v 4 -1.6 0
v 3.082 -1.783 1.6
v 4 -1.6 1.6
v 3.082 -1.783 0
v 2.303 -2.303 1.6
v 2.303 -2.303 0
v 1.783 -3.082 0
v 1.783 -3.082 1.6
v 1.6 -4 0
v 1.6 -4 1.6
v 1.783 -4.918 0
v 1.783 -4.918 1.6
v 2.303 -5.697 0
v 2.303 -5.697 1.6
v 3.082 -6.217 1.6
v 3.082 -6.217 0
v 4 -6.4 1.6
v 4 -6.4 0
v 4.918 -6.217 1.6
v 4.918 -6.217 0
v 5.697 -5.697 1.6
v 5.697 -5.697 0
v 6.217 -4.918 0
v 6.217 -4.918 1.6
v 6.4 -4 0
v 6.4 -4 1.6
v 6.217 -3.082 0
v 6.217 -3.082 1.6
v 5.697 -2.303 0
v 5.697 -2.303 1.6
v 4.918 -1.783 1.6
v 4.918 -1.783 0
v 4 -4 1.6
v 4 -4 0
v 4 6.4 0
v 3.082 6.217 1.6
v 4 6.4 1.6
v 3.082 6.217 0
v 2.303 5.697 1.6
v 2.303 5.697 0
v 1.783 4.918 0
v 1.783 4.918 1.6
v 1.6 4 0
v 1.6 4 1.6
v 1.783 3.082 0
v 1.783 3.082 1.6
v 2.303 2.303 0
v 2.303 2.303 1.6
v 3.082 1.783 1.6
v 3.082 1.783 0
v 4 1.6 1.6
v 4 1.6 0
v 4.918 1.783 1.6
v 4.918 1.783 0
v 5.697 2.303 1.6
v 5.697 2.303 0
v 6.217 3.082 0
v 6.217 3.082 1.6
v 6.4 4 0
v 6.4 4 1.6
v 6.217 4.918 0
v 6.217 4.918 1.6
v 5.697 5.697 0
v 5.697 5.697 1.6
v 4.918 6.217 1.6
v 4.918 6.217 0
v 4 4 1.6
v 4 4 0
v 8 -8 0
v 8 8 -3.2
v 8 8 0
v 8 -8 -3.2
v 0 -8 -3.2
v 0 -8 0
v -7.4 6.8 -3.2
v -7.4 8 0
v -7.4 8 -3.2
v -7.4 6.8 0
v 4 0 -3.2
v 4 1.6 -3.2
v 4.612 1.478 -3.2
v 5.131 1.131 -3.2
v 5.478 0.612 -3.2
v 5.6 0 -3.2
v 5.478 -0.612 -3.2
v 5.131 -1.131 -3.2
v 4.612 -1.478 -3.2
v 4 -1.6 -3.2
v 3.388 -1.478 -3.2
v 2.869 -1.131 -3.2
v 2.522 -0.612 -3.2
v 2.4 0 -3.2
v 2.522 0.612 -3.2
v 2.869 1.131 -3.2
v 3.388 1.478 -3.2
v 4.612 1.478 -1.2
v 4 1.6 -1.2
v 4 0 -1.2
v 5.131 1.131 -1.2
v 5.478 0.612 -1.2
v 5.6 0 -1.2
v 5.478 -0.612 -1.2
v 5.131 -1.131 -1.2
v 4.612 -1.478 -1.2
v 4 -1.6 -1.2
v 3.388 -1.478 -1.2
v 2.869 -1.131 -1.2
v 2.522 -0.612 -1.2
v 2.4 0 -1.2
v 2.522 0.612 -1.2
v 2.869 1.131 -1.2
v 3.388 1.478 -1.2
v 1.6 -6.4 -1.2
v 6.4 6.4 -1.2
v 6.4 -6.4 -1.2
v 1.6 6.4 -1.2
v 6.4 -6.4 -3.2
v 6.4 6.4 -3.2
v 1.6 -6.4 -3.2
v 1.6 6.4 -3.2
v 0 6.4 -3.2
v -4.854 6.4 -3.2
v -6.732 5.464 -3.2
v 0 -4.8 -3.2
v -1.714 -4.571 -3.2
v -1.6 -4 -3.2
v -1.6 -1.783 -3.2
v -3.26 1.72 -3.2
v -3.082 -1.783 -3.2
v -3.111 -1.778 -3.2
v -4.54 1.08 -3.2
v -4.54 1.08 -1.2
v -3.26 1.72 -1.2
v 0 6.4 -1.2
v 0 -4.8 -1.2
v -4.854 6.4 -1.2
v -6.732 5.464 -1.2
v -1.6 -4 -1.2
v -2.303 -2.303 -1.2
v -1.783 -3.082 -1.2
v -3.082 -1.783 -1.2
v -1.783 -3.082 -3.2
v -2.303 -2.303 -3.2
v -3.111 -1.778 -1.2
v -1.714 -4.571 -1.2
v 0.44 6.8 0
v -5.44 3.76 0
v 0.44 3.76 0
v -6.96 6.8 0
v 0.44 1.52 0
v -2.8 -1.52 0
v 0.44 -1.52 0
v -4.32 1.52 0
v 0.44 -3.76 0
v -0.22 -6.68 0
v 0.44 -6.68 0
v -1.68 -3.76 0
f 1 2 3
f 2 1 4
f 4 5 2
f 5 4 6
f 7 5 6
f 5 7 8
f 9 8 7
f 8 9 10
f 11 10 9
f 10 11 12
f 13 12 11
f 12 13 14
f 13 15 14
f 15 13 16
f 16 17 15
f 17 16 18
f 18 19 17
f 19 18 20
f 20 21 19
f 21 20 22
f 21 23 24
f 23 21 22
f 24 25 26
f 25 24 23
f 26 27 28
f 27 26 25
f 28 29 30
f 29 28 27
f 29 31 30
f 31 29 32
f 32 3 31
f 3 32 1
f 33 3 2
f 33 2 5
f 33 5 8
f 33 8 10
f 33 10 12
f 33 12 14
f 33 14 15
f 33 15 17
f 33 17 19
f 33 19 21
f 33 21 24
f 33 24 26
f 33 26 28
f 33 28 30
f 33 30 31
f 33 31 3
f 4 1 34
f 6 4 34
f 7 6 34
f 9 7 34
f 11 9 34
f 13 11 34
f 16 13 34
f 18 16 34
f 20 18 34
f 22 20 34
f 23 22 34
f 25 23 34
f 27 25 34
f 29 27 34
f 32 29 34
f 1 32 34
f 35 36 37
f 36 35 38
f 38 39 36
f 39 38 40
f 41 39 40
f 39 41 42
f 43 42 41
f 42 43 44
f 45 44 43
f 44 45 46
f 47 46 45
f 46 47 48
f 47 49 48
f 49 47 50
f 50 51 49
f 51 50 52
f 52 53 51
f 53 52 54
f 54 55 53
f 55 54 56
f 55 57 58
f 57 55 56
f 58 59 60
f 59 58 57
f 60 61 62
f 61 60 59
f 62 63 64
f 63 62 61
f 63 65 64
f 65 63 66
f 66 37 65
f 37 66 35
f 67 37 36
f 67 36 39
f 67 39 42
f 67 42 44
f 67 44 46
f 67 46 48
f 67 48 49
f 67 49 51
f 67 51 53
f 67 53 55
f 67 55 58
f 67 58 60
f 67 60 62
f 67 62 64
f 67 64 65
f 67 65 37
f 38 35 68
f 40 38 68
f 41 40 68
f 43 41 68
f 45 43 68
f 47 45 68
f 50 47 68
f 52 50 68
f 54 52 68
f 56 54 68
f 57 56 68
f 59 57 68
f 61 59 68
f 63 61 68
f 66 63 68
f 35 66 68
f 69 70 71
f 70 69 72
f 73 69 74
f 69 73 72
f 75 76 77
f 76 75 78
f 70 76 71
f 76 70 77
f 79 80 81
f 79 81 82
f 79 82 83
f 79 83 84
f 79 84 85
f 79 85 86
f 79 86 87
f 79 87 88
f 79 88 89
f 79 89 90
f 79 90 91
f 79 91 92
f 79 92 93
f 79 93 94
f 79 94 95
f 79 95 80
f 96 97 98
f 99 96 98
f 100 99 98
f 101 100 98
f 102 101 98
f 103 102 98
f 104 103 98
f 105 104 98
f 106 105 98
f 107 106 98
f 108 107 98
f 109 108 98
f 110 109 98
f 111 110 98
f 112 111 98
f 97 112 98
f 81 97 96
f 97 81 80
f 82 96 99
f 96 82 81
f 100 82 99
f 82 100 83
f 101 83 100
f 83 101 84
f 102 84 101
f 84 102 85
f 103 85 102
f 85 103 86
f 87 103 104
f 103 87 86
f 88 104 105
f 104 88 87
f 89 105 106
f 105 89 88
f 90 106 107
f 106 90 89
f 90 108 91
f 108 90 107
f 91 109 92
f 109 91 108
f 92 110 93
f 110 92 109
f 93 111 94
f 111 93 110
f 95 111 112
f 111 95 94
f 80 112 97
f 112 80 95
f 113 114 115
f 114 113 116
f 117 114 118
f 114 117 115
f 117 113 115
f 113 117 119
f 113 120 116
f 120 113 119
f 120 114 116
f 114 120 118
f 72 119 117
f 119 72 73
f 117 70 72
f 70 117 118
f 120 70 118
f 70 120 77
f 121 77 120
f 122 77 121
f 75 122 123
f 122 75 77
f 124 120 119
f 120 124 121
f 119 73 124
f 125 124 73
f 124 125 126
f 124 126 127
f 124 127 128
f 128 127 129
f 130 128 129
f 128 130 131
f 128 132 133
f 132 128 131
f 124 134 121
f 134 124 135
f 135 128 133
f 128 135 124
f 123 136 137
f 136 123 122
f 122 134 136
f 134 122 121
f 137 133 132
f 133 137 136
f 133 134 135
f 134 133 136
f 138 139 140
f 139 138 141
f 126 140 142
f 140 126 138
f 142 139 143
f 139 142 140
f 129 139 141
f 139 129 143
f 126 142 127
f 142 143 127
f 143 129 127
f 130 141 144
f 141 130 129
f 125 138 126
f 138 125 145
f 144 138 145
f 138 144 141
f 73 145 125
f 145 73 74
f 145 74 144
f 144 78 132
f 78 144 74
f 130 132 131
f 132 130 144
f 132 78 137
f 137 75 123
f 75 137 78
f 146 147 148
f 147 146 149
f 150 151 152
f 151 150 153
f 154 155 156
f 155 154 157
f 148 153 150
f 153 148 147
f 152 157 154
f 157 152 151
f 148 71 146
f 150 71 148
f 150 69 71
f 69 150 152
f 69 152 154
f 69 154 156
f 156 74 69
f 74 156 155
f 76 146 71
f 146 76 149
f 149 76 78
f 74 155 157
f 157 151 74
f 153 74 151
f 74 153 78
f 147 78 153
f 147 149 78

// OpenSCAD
// file: ../p/3-16edge.scad
use <../lib.scad>
function ldraw_lib__3_16edge() = [
// 0 Circle 0.1875
// 0 Name: 3-16edge.dat
// 0 Author: Donald Sutter [technog]
// 0 !LDRAW_ORG Primitive UPDATE 2017-01
// 0 !LICENSE Licensed under CC BY 4.0 : see CAreadme.txt
// 
// 0 BFC CERTIFY CCW
  [0,"BFC","CERTIFY"],
  [0,"BFC","CCW"],
// 
// 0 !HISTORY 2004-03-02 [PTadmin] Official Update 2004-01
// 0 !HISTORY 2007-06-24 [PTadmin] Header formatted for Contributor Agreement
// 0 !HISTORY 2008-07-01 [PTadmin] Official Update 2008-01
// 0 !HISTORY 2017-01-15 [Steffen] BFCed
// 0 !HISTORY 2017-12-30 [PTadmin] Official Update 2017-01
// 
// 
// 2 24 1 0 0 0.9239 0 0.3827
  [2,24,1,0,0,0.9239,0,0.3827],
// 2 24 0.9239 0 0.3827 0.7071 0 0.7071
  [2,24,0.9239,0,0.3827,0.7071,0,0.7071],
// 2 24 0.7071 0 0.7071 0.3827 0 0.9239
  [2,24,0.7071,0,0.7071,0.3827,0,0.9239],
];
module ldraw_lib__3_16edge(step=0, col=false, unit=2/5, alt=false, line=0.2, solid=!$preview)
    makepoly(ldraw_lib__3_16edge(), step=step, col=col, unit=unit, alt=alt, line=line, solid=solid);
ldraw_lib__3_16edge(line=0.2);
// file: ../p/3-16cyli.scad
use <../lib.scad>
$fa=1; $fs=0.2;
function ldraw_lib__3_16cyli(realsolid=false) = [
// 0 Cylinder 0.1875
// 0 Name: 3-16cyli.dat
// 0 Author: Mark Kennedy [mkennedy]
// 0 !LDRAW_ORG Primitive UPDATE 2005-01
// 0 !LICENSE Licensed under CC BY 2.0 and CC BY 4.0 : see CAreadme.txt
// 
// 0 BFC CERTIFY CCW
  [0,"BFC","CERTIFY"],
  [0,"BFC","CCW"],
// 
// 0 !HISTORY 2004-03-02 [PTadmin] Official Update 2004-01
// 0 !HISTORY 2004-12-11 [nielsk] Recreated using Primitive Generator, Edge lines fixed, BFC changed to CCW
// 0 !HISTORY 2005-12-28 [PTadmin] Official Update 2005-01
// 0 !HISTORY 2007-06-24 [PTadmin] Header formatted for Contributor Agreement
// 0 !HISTORY 2008-07-01 [PTadmin] Official Update 2008-01
// 
// 
// 4 16 .9239 1 .3827 .9239 0 .3827 1 0 0 1 1 0
  [4,16,.9239,1,.3827,.9239,0,.3827,1,0,0,1,1,0],
// 4 16 .7071 1 .7071 .7071 0 .7071 .9239 0 .3827 .9239 1 .3827
  [4,16,.7071,1,.7071,.7071,0,.7071,.9239,0,.3827,.9239,1,.3827],
// 4 16 .3827 1 .9239 .3827 0 .9239 .7071 0 .7071 .7071 1 .7071
  [4,16,.3827,1,.9239,.3827,0,.9239,.7071,0,.7071,.7071,1,.7071],
// 5 24 1 1 0 1 0 0 1 1 -.4142 .9239 1 .3827
  [5,24,1,1,0,1,0,0,1,1,-.4142,.9239,1,.3827],
// 5 24 .9239 1 .3827 .9239 0 .3827 1 1 0 .7071 1 .7071
  [5,24,.9239,1,.3827,.9239,0,.3827,1,1,0,.7071,1,.7071],
// 5 24 .7071 1 .7071 .7071 0 .7071 .9239 1 .3827 .3827 1 .9239
  [5,24,.7071,1,.7071,.7071,0,.7071,.9239,1,.3827,.3827,1,.9239],
// 5 24 .3827 1 .9239 .3827 0 .9239 .7071 1 .7071 0 1 1.0824
  [5,24,.3827,1,.9239,.3827,0,.9239,.7071,1,.7071,0,1,1.0824],
// 0
];
module ldraw_lib__3_16cyli(step=0, col=false, unit=2/5, alt=false, line=0.2, solid=!$preview)
    makepoly(ldraw_lib__3_16cyli(solid), step=step, col=col, unit=unit, alt=alt, line=line, solid=solid);
ldraw_lib__3_16cyli(line=0.2);
// file: ../p/4-4edge.scad
use <../lib.scad>
function ldraw_lib__4_4edge() = [
// 0 Circle 1.0
// 0 Name: 4-4edge.dat
// 0 Author: James Jessiman
// 0 !LDRAW_ORG Primitive UPDATE 2017-01
// 0 !LICENSE Licensed under CC BY 2.0 and CC BY 4.0 : see CAreadme.txt
// 
// 0 BFC CERTIFY CCW
  [0,"BFC","CERTIFY"],
  [0,"BFC","CCW"],
// 
// 0 !HISTORY 1998-12-15 [PTadmin] Official Update 1998-10
// 0 !HISTORY 2005-12-28 [PTadmin] Official Update 2005-01
// 0 !HISTORY 2007-06-24 [PTadmin] Header formatted for Contributor Agreement
// 0 !HISTORY 2008-07-01 [PTadmin] Official Update 2008-01
// 0 !HISTORY 2017-01-15 [Steffen] BFCed
// 0 !HISTORY 2017-12-30 [PTadmin] Official Update 2017-01
// 
// 
// 2 24 1 0 0 0.9239 0 0.3827
  [2,24,1,0,0,0.9239,0,0.3827],
// 2 24 0.9239 0 0.3827 0.7071 0 0.7071
  [2,24,0.9239,0,0.3827,0.7071,0,0.7071],
// 2 24 0.7071 0 0.7071 0.3827 0 0.9239
  [2,24,0.7071,0,0.7071,0.3827,0,0.9239],
// 2 24 0.3827 0 0.9239 0 0 1
  [2,24,0.3827,0,0.9239,0,0,1],
// 2 24 0 0 1 -0.3827 0 0.9239
  [2,24,0,0,1,-0.3827,0,0.9239],
// 2 24 -0.3827 0 0.9239 -0.7071 0 0.7071
  [2,24,-0.3827,0,0.9239,-0.7071,0,0.7071],
// 2 24 -0.7071 0 0.7071 -0.9239 0 0.3827
  [2,24,-0.7071,0,0.7071,-0.9239,0,0.3827],
// 2 24 -0.9239 0 0.3827 -1 0 -0
  [2,24,-0.9239,0,0.3827,-1,0,-0],
// 2 24 -1 0 -0 -0.9239 0 -0.3827
  [2,24,-1,0,-0,-0.9239,0,-0.3827],
// 2 24 -0.9239 0 -0.3827 -0.7071 0 -0.7071
  [2,24,-0.9239,0,-0.3827,-0.7071,0,-0.7071],
// 2 24 -0.7071 0 -0.7071 -0.3827 0 -0.9239
  [2,24,-0.7071,0,-0.7071,-0.3827,0,-0.9239],
// 2 24 -0.3827 0 -0.9239 0 0 -1
  [2,24,-0.3827,0,-0.9239,0,0,-1],
// 2 24 0 0 -1 0.3827 0 -0.9239
  [2,24,0,0,-1,0.3827,0,-0.9239],
// 2 24 0.3827 0 -0.9239 0.7071 0 -0.7071
  [2,24,0.3827,0,-0.9239,0.7071,0,-0.7071],
// 2 24 0.7071 0 -0.7071 0.9239 0 -0.3827
  [2,24,0.7071,0,-0.7071,0.9239,0,-0.3827],
// 2 24 0.9239 0 -0.3827 1 0 0
  [2,24,0.9239,0,-0.3827,1,0,0],
];
module ldraw_lib__4_4edge(step=0, col=false, unit=2/5, alt=false, line=0.2, solid=!$preview)
    makepoly(ldraw_lib__4_4edge(), step=step, col=col, unit=unit, alt=alt, line=line, solid=solid);
ldraw_lib__4_4edge(line=0.2);
// file: ../p/4-4disc.scad
use <../lib.scad>
function ldraw_lib__4_4disc() = [
// 0 Disc 1.0
// 0 Name: 4-4disc.dat
// 0 Author: James Jessiman
// 0 !LDRAW_ORG Primitive UPDATE 2002-02
// 0 !LICENSE Licensed under CC BY 2.0 and CC BY 4.0 : see CAreadme.txt
// 
// 0 BFC CERTIFY CCW
  [0,"BFC","CERTIFY"],
  [0,"BFC","CCW"],
// 
// 0 !HISTORY 1998-12-15 [PTadmin] Official Update 1998-10
// 0 !HISTORY 2002-03-23 [sbliss] Added BFC statement
// 0 !HISTORY 2002-04-25 [PTadmin] Official Update 2002-02
// 0 !HISTORY 2007-06-24 [PTadmin] Header formatted for Contributor Agreement
// 0 !HISTORY 2008-07-01 [PTadmin] Official Update 2008-01
// 
// 
// 3 16 0 0 0 1 0 0 0.9239 0 0.3827
  [3,16,0,0,0,1,0,0,0.9239,0,0.3827],
// 3 16 0 0 0 0.9239 0 0.3827 0.7071 0 0.7071
  [3,16,0,0,0,0.9239,0,0.3827,0.7071,0,0.7071],
// 3 16 0 0 0 0.7071 0 0.7071 0.3827 0 0.9239
  [3,16,0,0,0,0.7071,0,0.7071,0.3827,0,0.9239],
// 3 16 0 0 0 0.3827 0 0.9239 0 0 1
  [3,16,0,0,0,0.3827,0,0.9239,0,0,1],
// 3 16 0 0 0 0 0 1 -0.3827 0 0.9239
  [3,16,0,0,0,0,0,1,-0.3827,0,0.9239],
// 3 16 0 0 0 -0.3827 0 0.9239 -0.7071 0 0.7071
  [3,16,0,0,0,-0.3827,0,0.9239,-0.7071,0,0.7071],
// 3 16 0 0 0 -0.7071 0 0.7071 -0.9239 0 0.3827
  [3,16,0,0,0,-0.7071,0,0.7071,-0.9239,0,0.3827],
// 3 16 0 0 0 -0.9239 0 0.3827 -1 0 -0
  [3,16,0,0,0,-0.9239,0,0.3827,-1,0,-0],
// 3 16 0 0 0 -1 0 -0 -0.9239 0 -0.3827
  [3,16,0,0,0,-1,0,-0,-0.9239,0,-0.3827],
// 3 16 0 0 0 -0.9239 0 -0.3827 -0.7071 0 -0.7071
  [3,16,0,0,0,-0.9239,0,-0.3827,-0.7071,0,-0.7071],
// 3 16 0 0 0 -0.7071 0 -0.7071 -0.3827 0 -0.9239
  [3,16,0,0,0,-0.7071,0,-0.7071,-0.3827,0,-0.9239],
// 3 16 0 0 0 -0.3827 0 -0.9239 0 0 -1
  [3,16,0,0,0,-0.3827,0,-0.9239,0,0,-1],
// 3 16 0 0 0 0 0 -1 0.3827 0 -0.9239
  [3,16,0,0,0,0,0,-1,0.3827,0,-0.9239],
// 3 16 0 0 0 0.3827 0 -0.9239 0.7071 0 -0.7071
  [3,16,0,0,0,0.3827,0,-0.9239,0.7071,0,-0.7071],
// 3 16 0 0 0 0.7071 0 -0.7071 0.9239 0 -0.3827
  [3,16,0,0,0,0.7071,0,-0.7071,0.9239,0,-0.3827],
// 3 16 0 0 0 0.9239 0 -0.3827 1 0 0
  [3,16,0,0,0,0.9239,0,-0.3827,1,0,0],
// 0
];
module ldraw_lib__4_4disc(step=0, col=false, unit=2/5, alt=false, line=0.2, solid=!$preview)
    makepoly(ldraw_lib__4_4disc(), step=step, col=col, unit=unit, alt=alt, line=line, solid=solid);
ldraw_lib__4_4disc(line=0.2);
// file: ../p/4-4cyli.scad
use <../lib.scad>
$fa=1; $fs=0.2;
function ldraw_lib__4_4cyli(realsolid=false) = [
// 0 Cylinder 1.0
// 0 Name: 4-4cyli.dat
// 0 Author: James Jessiman
// 0 !LDRAW_ORG Primitive UPDATE 2005-01
// 0 !LICENSE Licensed under CC BY 2.0 and CC BY 4.0 : see CAreadme.txt
// 
// 0 BFC CERTIFY CCW
  [0,"BFC","CERTIFY"],
  [0,"BFC","CCW"],
// 
// 0 !HISTORY 1998-12-15 [PTadmin] Official Update 1998-10
// 0 !HISTORY 2002-03-23 [sbliss] Added BFC statement; merged headers from files in distributions LDraw 0.27 and Complete.
// 0 !HISTORY 2002-04-25 [PTadmin] Official Update 2002-02
// 0 !HISTORY 2004-12-14 [guyvivan] BFC CCW
// 0 !HISTORY 2005-12-28 [PTadmin] Official Update 2005-01
// 0 !HISTORY 2007-06-24 [PTadmin] Header formatted for Contributor Agreement
// 0 !HISTORY 2008-07-01 [PTadmin] Official Update 2008-01
// 
// 
// 4 16 1 1 0 0.9239 1 0.3827 0.9239 0 0.3827 1 0 0
  [4,16,1,1,0,0.9239,1,0.3827,0.9239,0,0.3827,1,0,0],
// 5 24 1 0 0 1 1 0 0.9239 0 0.3827 0.9239 0 -0.3827
  [5,24,1,0,0,1,1,0,0.9239,0,0.3827,0.9239,0,-0.3827],
// 4 16 0.9239 1 0.3827 0.7071 1 0.7071 0.7071 0 0.7071 0.9239 0 0.3827
  [4,16,0.9239,1,0.3827,0.7071,1,0.7071,0.7071,0,0.7071,0.9239,0,0.3827],
// 5 24 0.9239 0 0.3827 0.9239 1 0.3827 0.7071 0 0.7071 1 0 0
  [5,24,0.9239,0,0.3827,0.9239,1,0.3827,0.7071,0,0.7071,1,0,0],
// 4 16 0.7071 1 0.7071 0.3827 1 0.9239 0.3827 0 0.9239 0.7071 0 0.7071
  [4,16,0.7071,1,0.7071,0.3827,1,0.9239,0.3827,0,0.9239,0.7071,0,0.7071],
// 5 24 0.7071 0 0.7071 0.7071 1 0.7071 0.3827 0 0.9239 0.9239 0 0.3827
  [5,24,0.7071,0,0.7071,0.7071,1,0.7071,0.3827,0,0.9239,0.9239,0,0.3827],
// 4 16 0.3827 1 0.9239 0 1 1 0 0 1 0.3827 0 0.9239
  [4,16,0.3827,1,0.9239,0,1,1,0,0,1,0.3827,0,0.9239],
// 5 24 0.3827 0 0.9239 0.3827 1 0.9239 0 0 1 0.7071 0 0.7071
  [5,24,0.3827,0,0.9239,0.3827,1,0.9239,0,0,1,0.7071,0,0.7071],
// 4 16 0 1 1 -0.3827 1 0.9239 -0.3827 0 0.9239 0 0 1
  [4,16,0,1,1,-0.3827,1,0.9239,-0.3827,0,0.9239,0,0,1],
// 5 24 0 0 1 0 1 1 -0.3827 0 0.9239 0.3827 0 0.9239
  [5,24,0,0,1,0,1,1,-0.3827,0,0.9239,0.3827,0,0.9239],
// 4 16 -0.3827 1 0.9239 -0.7071 1 0.7071 -0.7071 0 0.7071 -0.3827 0 0.9239
  [4,16,-0.3827,1,0.9239,-0.7071,1,0.7071,-0.7071,0,0.7071,-0.3827,0,0.9239],
// 5 24 -0.3827 0 0.9239 -0.3827 1 0.9239 -0.7071 0 0.7071 0 0 1
  [5,24,-0.3827,0,0.9239,-0.3827,1,0.9239,-0.7071,0,0.7071,0,0,1],
// 4 16 -0.7071 1 0.7071 -0.9239 1 0.3827 -0.9239 0 0.3827 -0.7071 0 0.7071
  [4,16,-0.7071,1,0.7071,-0.9239,1,0.3827,-0.9239,0,0.3827,-0.7071,0,0.7071],
// 5 24 -0.7071 0 0.7071 -0.7071 1 0.7071 -0.9239 0 0.3827 -0.3827 0 0.9239
  [5,24,-0.7071,0,0.7071,-0.7071,1,0.7071,-0.9239,0,0.3827,-0.3827,0,0.9239],
// 4 16 -0.9239 1 0.3827 -1 1 0 -1 0 0 -0.9239 0 0.3827
  [4,16,-0.9239,1,0.3827,-1,1,0,-1,0,0,-0.9239,0,0.3827],
// 5 24 -0.9239 0 0.3827 -0.9239 1 0.3827 -1 0 0 -0.7071 0 0.7071
  [5,24,-0.9239,0,0.3827,-0.9239,1,0.3827,-1,0,0,-0.7071,0,0.7071],
// 4 16 -1 1 0 -0.9239 1 -0.3827 -0.9239 0 -0.3827 -1 0 0
  [4,16,-1,1,0,-0.9239,1,-0.3827,-0.9239,0,-0.3827,-1,0,0],
// 5 24 -1 0 0 -1 1 0 -0.9239 0 -0.3827 -0.9239 0 0.3827
  [5,24,-1,0,0,-1,1,0,-0.9239,0,-0.3827,-0.9239,0,0.3827],
// 4 16 -0.9239 1 -0.3827 -0.7071 1 -0.7071 -0.7071 0 -0.7071 -0.9239 0 -0.3827
  [4,16,-0.9239,1,-0.3827,-0.7071,1,-0.7071,-0.7071,0,-0.7071,-0.9239,0,-0.3827],
// 5 24 -0.9239 0 -0.3827 -0.9239 1 -0.3827 -0.7071 0 -0.7071 -1 0 0
  [5,24,-0.9239,0,-0.3827,-0.9239,1,-0.3827,-0.7071,0,-0.7071,-1,0,0],
// 4 16 -0.7071 1 -0.7071 -0.3827 1 -0.9239 -0.3827 0 -0.9239 -0.7071 0 -0.7071
  [4,16,-0.7071,1,-0.7071,-0.3827,1,-0.9239,-0.3827,0,-0.9239,-0.7071,0,-0.7071],
// 5 24 -0.7071 0 -0.7071 -0.7071 1 -0.7071 -0.3827 0 -0.9239 -0.9239 0 -0.3827
  [5,24,-0.7071,0,-0.7071,-0.7071,1,-0.7071,-0.3827,0,-0.9239,-0.9239,0,-0.3827],
// 4 16 -0.3827 1 -0.9239 0 1 -1 0 0 -1 -0.3827 0 -0.9239
  [4,16,-0.3827,1,-0.9239,0,1,-1,0,0,-1,-0.3827,0,-0.9239],
// 5 24 -0.3827 0 -0.9239 -0.3827 1 -0.9239 0 0 -1 -0.7071 0 -0.7071
  [5,24,-0.3827,0,-0.9239,-0.3827,1,-0.9239,0,0,-1,-0.7071,0,-0.7071],
// 4 16 0 1 -1 0.3827 1 -0.9239 0.3827 0 -0.9239 0 0 -1
  [4,16,0,1,-1,0.3827,1,-0.9239,0.3827,0,-0.9239,0,0,-1],
// 5 24 0 0 -1 0 1 -1 0.3827 0 -0.9239 -0.3827 0 -0.9239
  [5,24,0,0,-1,0,1,-1,0.3827,0,-0.9239,-0.3827,0,-0.9239],
// 4 16 0.3827 1 -0.9239 0.7071 1 -0.7071 0.7071 0 -0.7071 0.3827 0 -0.9239
  [4,16,0.3827,1,-0.9239,0.7071,1,-0.7071,0.7071,0,-0.7071,0.3827,0,-0.9239],
// 5 24 0.3827 0 -0.9239 0.3827 1 -0.9239 0.7071 0 -0.7071 0 0 -1
  [5,24,0.3827,0,-0.9239,0.3827,1,-0.9239,0.7071,0,-0.7071,0,0,-1],
// 4 16 0.7071 1 -0.7071 0.9239 1 -0.3827 0.9239 0 -0.3827 0.7071 0 -0.7071
  [4,16,0.7071,1,-0.7071,0.9239,1,-0.3827,0.9239,0,-0.3827,0.7071,0,-0.7071],
// 5 24 0.7071 0 -0.7071 0.7071 1 -0.7071 0.9239 0 -0.3827 0.3827 0 -0.9239
  [5,24,0.7071,0,-0.7071,0.7071,1,-0.7071,0.9239,0,-0.3827,0.3827,0,-0.9239],
// 4 16 0.9239 1 -0.3827 1 1 0 1 0 0 0.9239 0 -0.3827
  [4,16,0.9239,1,-0.3827,1,1,0,1,0,0,0.9239,0,-0.3827],
// 5 24 0.9239 0 -0.3827 0.9239 1 -0.3827 1 0 0 0.7071 0 -0.7071
  [5,24,0.9239,0,-0.3827,0.9239,1,-0.3827,1,0,0,0.7071,0,-0.7071],
// 0
];
module ldraw_lib__4_4cyli(step=0, col=false, unit=2/5, alt=false, line=0.2, solid=!$preview)
    makepoly(ldraw_lib__4_4cyli(solid), step=step, col=col, unit=unit, alt=alt, line=line, solid=solid);
ldraw_lib__4_4cyli(line=0.2);
// file: ../p/rect3.scad
use <../lib.scad>
function ldraw_lib__rect3() = [
// 0 Rectangle with 3 Edges
// 0 Name: rect3.dat
// 0 Author: Mark Kennedy [mkennedy]
// 0 !LDRAW_ORG Primitive UPDATE 2010-01
// 0 !LICENSE Licensed under CC BY 4.0 : see CAreadme.txt
// 
// 0 BFC CERTIFY CCW
  [0,"BFC","CERTIFY"],
  [0,"BFC","CCW"],
// 
// 0 !HISTORY 2003-08-01 [PTadmin] Official Update 2003-02
// 0 !HISTORY 2007-06-24 [PTadmin] Header formatted for Contributor Agreement
// 0 !HISTORY 2008-07-01 [PTadmin] Official Update 2008-01
// 0 !HISTORY 2010-01-17 [mikeheide] Change winding to CCW
// 0 !HISTORY 2010-04-05 [PTadmin] Official Update 2010-01
// 
// 
// 2 24 1 0 1 -1 0 1
  [2,24,1,0,1,-1,0,1],
// 2 24 1 0 1 1 0 -1
  [2,24,1,0,1,1,0,-1],
// 2 24 -1 0 1 -1 0 -1
  [2,24,-1,0,1,-1,0,-1],
// 4 16 -1 0 1 -1 0 -1 1 0 -1 1 0 1
  [4,16,-1,0,1,-1,0,-1,1,0,-1,1,0,1],
// 0 //
];
module ldraw_lib__rect3(step=0, col=false, unit=2/5, alt=false, line=0.2, solid=!$preview)
    makepoly(ldraw_lib__rect3(), step=step, col=col, unit=unit, alt=alt, line=line, solid=solid);
ldraw_lib__rect3(line=0.2);
// file: ../p/rect.scad
use <../lib.scad>
function ldraw_lib__rect() = [
// 0 Rectangle
// 0 Name: rect.dat
// 0 Author: James Jessiman
// 0 !LDRAW_ORG Primitive UPDATE 2010-01
// 0 !LICENSE Licensed under CC BY 2.0 and CC BY 4.0 : see CAreadme.txt
// 
// 0 BFC CERTIFY CCW
  [0,"BFC","CERTIFY"],
  [0,"BFC","CCW"],
// 
// 0 !HISTORY 2002-04-05 [hafhead] Added BFC statement
// 0 !HISTORY 2002-04-25 [PTadmin] Official Update 2002-02
// 0 !HISTORY 2007-06-24 [PTadmin] Header formatted for Contributor Agreement
// 0 !HISTORY 2008-07-01 [PTadmin] Official Update 2008-01
// 0 !HISTORY 2010-01-17 [mikeheide] changed winding to CCW
// 0 !HISTORY 2010-04-05 [PTadmin] Official Update 2010-01
// 
// 
// 2 24 1 0 1 -1 0 1
  [2,24,1,0,1,-1,0,1],
// 2 24 -1 0 1 -1 0 -1
  [2,24,-1,0,1,-1,0,-1],
// 2 24 -1 0 -1 1 0 -1
  [2,24,-1,0,-1,1,0,-1],
// 2 24 1 0 -1 1 0 1
  [2,24,1,0,-1,1,0,1],
// 4 16 -1 0 1 -1 0 -1 1 0 -1 1 0 1
  [4,16,-1,0,1,-1,0,-1,1,0,-1,1,0,1],
// 0
];
makepoly(ldraw_lib__rect(), line=0.2);
// file: ../p/3-16tndis.scad
use <../lib.scad>
function ldraw_lib__3_16tndis() = [
// 0 Disc Negative Truncated 0.1875
// 0 Name: 3-16tndis.dat
// 0 Author: Massimo Maso [Sirio]
// 0 !LDRAW_ORG Primitive UPDATE 2022-02
// 0 !LICENSE Licensed under CC BY 4.0 : see CAreadme.txt
// 
// 0 BFC CERTIFY CCW
  [0,"BFC","CERTIFY"],
  [0,"BFC","CCW"],
// 
// 0 !HISTORY 2022-03-06 [PTadmin] Official Update 2022-02
// 
// 
// 3 16 1 0 .9239 .9239 0 .3827 1 0 0
  [3,16,1,0,.9239,.9239,0,.3827,1,0,0],
// 3 16 1 0 .9239 .7071 0 .7071 .9239 0 .3827
  [3,16,1,0,.9239,.7071,0,.7071,.9239,0,.3827],
// 3 16 1 0 .9239 .3827 0 .9239 .7071 0 .7071
  [3,16,1,0,.9239,.3827,0,.9239,.7071,0,.7071],
];
module ldraw_lib__3_16tndis(step=0, col=false, unit=2/5, alt=false, line=0.2, solid=!$preview)
    makepoly(ldraw_lib__3_16tndis(), step=step, col=col, unit=unit, alt=alt, line=line, solid=solid);
ldraw_lib__3_16tndis(line=0.2);
// file: ../p/3-16cylo.scad
use <../lib.scad>
use <3-16cyli.scad>
use <3-16edge.scad>
$fa=1; $fs=0.2;
function ldraw_lib__3_16cylo(realsolid=false) = [
// 0 Cylinder Open 0.1875
// 0 Name: 3-16cylo.dat
// 0 Author: J.C. Tchang [tchang]
// 0 !LDRAW_ORG Primitive UPDATE 2013-01
// 0 !LICENSE Licensed under CC BY 2.0 and CC BY 4.0 : see CAreadme.txt
// 
// 0 BFC CERTIFY CCW
  [0,"BFC","CERTIFY"],
  [0,"BFC","CCW"],
// 
// 0 !HISTORY 2013-07-21 [PTadmin] Official Update 2013-01
// 
// 
// 1 16 0 0 0 1 0 0 0 1 0 0 0 1 3-16edge.dat
  [1,16,0,0,0,1,0,0,0,1,0,0,0,1, ldraw_lib__3_16edge(realsolid)],
// 1 16 0 1 0 1 0 0 0 1 0 0 0 1 3-16edge.dat
  [1,16,0,1,0,1,0,0,0,1,0,0,0,1, ldraw_lib__3_16edge(realsolid)],
// 1 16 0 0 0 1 0 0 0 1 0 0 0 1 3-16cyli.dat
  [1,16,0,0,0,1,0,0,0,1,0,0,0,1, ldraw_lib__3_16cyli(realsolid)],
];
module ldraw_lib__3_16cylo(step=0, col=false, unit=2/5, alt=false, line=0.2, solid=!$preview)
    makepoly(ldraw_lib__3_16cylo(solid), step=step, col=col, unit=unit, alt=alt, line=line, solid=solid);
ldraw_lib__3_16cylo(line=0.2);
// file: ../p/3-16chrd.scad
use <../lib.scad>
$fa=1; $fs=0.2;
function ldraw_lib__3_16chrd(realsolid=false) = [
// 0 Chord 0.1875
// 0 Name: 3-16chrd.dat
// 0 Author: Niels Karsdorp [nielsk]
// 0 !LDRAW_ORG Primitive UPDATE 2009-01
// 0 !LICENSE Licensed under CC BY 2.0 and CC BY 4.0 : see CAreadme.txt
// 
// 0 BFC CERTIFY CCW
  [0,"BFC","CERTIFY"],
  [0,"BFC","CCW"],
// 
// 0 !HISTORY 2009-05-02 [PTadmin] Official Update 2009-01
// 
// 
// 4 16 1 0 0 0.9239 0 0.3827 0.7071 0 0.7071 0.3827 0 0.9239
  [4,16,1,0,0,0.9239,0,0.3827,0.7071,0,0.7071,0.3827,0,0.9239],
// 0
// 
];
module ldraw_lib__3_16chrd(step=0, col=false, unit=2/5, alt=false, line=0.2, solid=!$preview)
    makepoly(ldraw_lib__3_16chrd(solid), step=step, col=col, unit=unit, alt=alt, line=line, solid=solid);
ldraw_lib__3_16chrd(line=0.2);
// file: ../p/stud.scad
use <../lib.scad>
use <4-4cyli.scad>
use <4-4disc.scad>
use <4-4edge.scad>
function ldraw_lib__stud() = [
// 0 Stud
// 0 Name: stud.dat
// 0 Author: James Jessiman
// 0 !LDRAW_ORG Primitive UPDATE 2012-01
// 0 !LICENSE Licensed under CC BY 4.0 : see CAreadme.txt
// 
// 0 BFC CERTIFY CCW
  [0,"BFC","CERTIFY"],
  [0,"BFC","CCW"],
// 
// 0 !HISTORY 2002-04-04 [sbliss] Modified for BFC compliance
// 0 !HISTORY 2002-04-25 [PTadmin] Official Update 2002-02
// 0 !HISTORY 2007-06-24 [PTadmin] Header formatted for Contributor Agreement
// 0 !HISTORY 2008-07-01 [PTadmin] Official Update 2008-01
// 0 !HISTORY 2012-02-16 [Philo] Changed to CCW
// 0 !HISTORY 2012-03-30 [PTadmin] Official Update 2012-01
// 
// 
// 1 16 0 0 0 6 0 0 0 1 0 0 0 6 4-4edge.dat
  [1,16,0,0,0,6,0,0,0,1,0,0,0,6, ldraw_lib__4_4edge()],
// 1 16 0 -4 0 6 0 0 0 1 0 0 0 6 4-4edge.dat
  [1,16,0,-4,0,6,0,0,0,1,0,0,0,6, ldraw_lib__4_4edge()],
// 1 16 0 0 0 6 0 0 0 -4 0 0 0 6 4-4cyli.dat
  [1,16,0,0,0,6,0,0,0,-4,0,0,0,6, ldraw_lib__4_4cyli()],
// 1 16 0 -4 0 6 0 0 0 1 0 0 0 6 4-4disc.dat
  [1,16,0,-4,0,6,0,0,0,1,0,0,0,6, ldraw_lib__4_4disc()],
  [-1,16,0,0,0,6,0,0,0,-1,0,0,0,6, ldraw_lib__4_4disc()],
];
module ldraw_lib__stud(step=0, col=false, unit=2/5, alt=false, line=0.2, solid=!$preview)
    makepoly(ldraw_lib__stud(), step=step, col=col, unit=unit, alt=alt, line=line, solid=solid);
ldraw_lib__stud(line=0.2);
// file: ../p/stud3.scad
use <../lib.scad>
use <4-4cyli.scad>
use <4-4disc.scad>
use <4-4edge.scad>
function ldraw_lib__stud3() = [
// 0 Stud Tube Solid
// 0 Name: stud3.dat
// 0 Author: James Jessiman
// 0 !LDRAW_ORG Primitive UPDATE 2012-01
// 0 !LICENSE Licensed under CC BY 4.0 : see CAreadme.txt
// 
// 0 BFC CERTIFY CCW
  [0,"BFC","CERTIFY"],
  [0,"BFC","CCW"],
// 
// 0 !HISTORY 2002-04-04 [sbliss] Modified for BFC compliance
// 0 !HISTORY 2002-04-25 [PTadmin] Official Update 2002-02
// 0 !HISTORY 2007-06-24 [PTadmin] Header formatted for Contributor Agreement
// 0 !HISTORY 2008-07-01 [PTadmin] Official Update 2008-01
// 0 !HISTORY 2012-02-16 [Philo] Changed to CCW
// 0 !HISTORY 2012-03-30 [PTadmin] Official Update 2012-01
// 
// 
// 1 16 0 -4 0 4 0 0 0 1 0 0 0 4 4-4edge.dat
  [1,16,0,-4,0,4,0,0,0,1,0,0,0,4, ldraw_lib__4_4edge()],
// 1 16 0 0 0 4 0 0 0 1 0 0 0 4 4-4edge.dat
  [1,16,0,0,0,4,0,0,0,1,0,0,0,4, ldraw_lib__4_4edge()],
// 1 16 0 -4 0 4 0 0 0 1 0 0 0 4 4-4disc.dat
  [1,16,0,-4,0,4,0,0,0,1,0,0,0,4, ldraw_lib__4_4disc()],
  [-1,16,0,0,0,4,0,0,0,-1,0,0,0,4, ldraw_lib__4_4disc()],
// 1 16 0 -4 0 4 0 0 0 4 0 0 0 4 4-4cyli.dat
  [1,16,0,-4,0,4,0,0,0,4,0,0,0,4, ldraw_lib__4_4cyli()],
];
module ldraw_lib__stud3(step=0, col=false, unit=2/5, alt=false, line=0.2, solid=!$preview)
    makepoly(ldraw_lib__stud3(), step=step, col=col, unit=unit, alt=alt, line=line, solid=solid);
ldraw_lib__stud3(line=0.2);
// file: s/51739s01.scad
use <../../lib.scad>
use <../../p/3-16chrd.scad>
use <../../p/3-16cylo.scad>
use <../../p/3-16tndis.scad>
use <../../p/box2-5.scad>
use <../../p/box2-7.scad>
use <../../p/rect.scad>
use <../../p/rect3.scad>
function ldraw_lib__s__51739s01() = [
// 0 ~Wing  2 x  4 - Half Bottom Section
// 0 Name: s\51739s01.dat
// 0 Author: Magnus Forsberg [MagFors]
// 0 !LDRAW_ORG Subpart UPDATE 2025-07
// 0 !LICENSE Licensed under CC BY 4.0 : see CAreadme.txt
// 
// 0 BFC CERTIFY CCW
  [0,"BFC","CERTIFY"],
  [0,"BFC","CCW"],
// 
// 0 !HISTORY 2017-12-30 [PTadmin] Official Update 2017-01
// 0 !HISTORY 2025-04-19 [Blechtaler] used cylo prim for the stud dent
// 0 !HISTORY 2025-07-12 [MagFors] Removed top surface for prints
// 0 !HISTORY 2025-07-27 [OrionP] Official Update 2025-07
// 
// 3 16 16 8 16 38.5 8 20 20 8 16
  [3,16,16,8,16,38.5,8,20,20,8,16],
// 3 16 20 8 16 38.5 8 20 32.136 8 16
  [3,16,20,8,16,38.5,8,20,32.136,8,16],
// 2 24 38.5 0 17 20 0 -20
  [2,24,38.5,0,17,20,0,-20],
// 2 24 38.5 8 17 38.5 0 17
  [2,24,38.5,8,17,38.5,0,17],
// 
// 4 16 32.136 8 16 38.5 8 20 38.5 8 17 36.83 8 13.66
  [4,16,32.136,8,16,38.5,8,20,38.5,8,17,36.83,8,13.66],
// 4 16 16 8 16 20 8 16 20 8 -12 16 8 -16
  [4,16,16,8,16,20,8,16,20,8,-12,16,8,-16],
// 3 16 20 8 -12 20 8 -20 16 8 -16
  [3,16,20,8,-12,20,8,-20,16,8,-16],
// 4 16 20 8 -12 24 8 -10 24.2857 8 -11.4286 20 8 -20
  [4,16,20,8,-12,24,8,-10,24.2857,8,-11.4286,20,8,-20],
// 3 16 24 8 -4.4566 24 8 -10 20 8 -12
  [3,16,24,8,-4.4566,24,8,-10,20,8,-12],
// 3 16 28.15 8 4.3 24 8 -4.4566 20 8 -12
  [3,16,28.15,8,4.3,24,8,-4.4566,20,8,-12],
// 3 16 27.7038 8 -4.4566 24 8 -4.4566 28.15 8 4.3
  [3,16,27.7038,8,-4.4566,24,8,-4.4566,28.15,8,4.3],
// 4 16 31.35 8 2.7 27.7778 8 -4.4444 27.7038 8 -4.4566 28.15 8 4.3
  [4,16,31.35,8,2.7,27.7778,8,-4.4444,27.7038,8,-4.4566,28.15,8,4.3],
// 2 24 24.2857 8 -11.4286 20 8 -20
  [2,24,24.2857,8,-11.4286,20,8,-20],
// 2 24 31.35 8 2.7 27.7778 8 -4.4444
  [2,24,31.35,8,2.7,27.7778,8,-4.4444],
// 2 24 36.83 8 13.66 38.5 8 17
  [2,24,36.83,8,13.66,38.5,8,17],
// 2 24 31.35 3 2.7 36.83 3 13.66
  [2,24,31.35,3,2.7,36.83,3,13.66],
// 1 16 29.75 5.5 3.5 0 0 -1.6 2.5 0 0 0 -1 0.8 rect.dat
  [1,16,29.75,5.5,3.5,0,0,-1.6,2.5,0,0,0,-1,0.8, ldraw_lib__rect()],
// 0 BFC INVERTNEXT
  [0,"BFC","INVERTNEXT"],
// 1 16 24.075 5.5 10.15 0 -4.075 0 -2.5 0 0 0 -8.15 -14 box2-7.dat
  [1,16,24.075,5.5,10.15,0,-4.075,0,-2.5,0,0,0,-8.15,-14, ldraw_lib__box2_7()],
// 0 BFC INVERTNEXT
  [0,"BFC","INVERTNEXT"],
// 1 16 28.415 5.5 14.83 0 6.068 -2.347 -2.5 0 0 0 0 1.17 box2-5.dat
  [1,16,28.415,5.5,14.83,0,6.068,-2.347,-2.5,0,0,0,0,1.17, ldraw_lib__box2_5()],
// 4 16 36.83 3 13.66 31.35 3 2.7 28.15 3 4.3 32.136 3 16
  [4,16,36.83,3,13.66,31.35,3,2.7,28.15,3,4.3,32.136,3,16],
// 4 16 32.136 3 16 28.15 3 4.3 20 3 -12 20 3 16
  [4,16,32.136,3,16,28.15,3,4.3,20,3,-12,20,3,16],
// 
// 1 16 30 3 -10 -6 0 0 0 -1 0 0 0 6 3-16chrd.dat
  [1,16,30,3,-10,-6,0,0,0,-1,0,0,0,6, ldraw_lib__3_16chrd()],
// 0 BFC INVERTNEXT
  [0,"BFC","INVERTNEXT"],
// 1 16 30 3 -10 -6 0 0 0 5 0 0 0 6 3-16cylo.dat
  [1,16,30,3,-10,-6,0,0,0,5,0,0,0,6, ldraw_lib__3_16cylo()],
// 1 16 30 8 -10 -6 0 0 0 -1 0 0 0 6 3-16tndis.dat
  [1,16,30,8,-10,-6,0,0,0,-1,0,0,0,6, ldraw_lib__3_16tndis()],
// 
// 1 16 27.7408 5.5 -4.4505 0 0 0.037 2.5 0 0 0 1 0.0061 rect3.dat
  [1,16,27.7408,5.5,-4.4505,0,0,0.037,2.5,0,0,0,1,0.0061, ldraw_lib__rect3()],
// 1 16 24.14285 5.5 -10.7143 0 -1 0.14285 -2.5 0 0 0 0 -0.7143 rect3.dat
  [1,16,24.14285,5.5,-10.7143,0,-1,0.14285,-2.5,0,0,0,0,-0.7143, ldraw_lib__rect3()],
// 5 24 27.7038 3 -4.4566 27.7038 8 -4.4566 28.486 3 -4.301 25.7574 3 -5.7574
  [5,24,27.7038,3,-4.4566,27.7038,8,-4.4566,28.486,3,-4.301,25.7574,3,-5.7574],
// 5 24 24 3 -10 24 8 -10 24.4566 3 -7.7038 24.378 3 -11.9
  [5,24,24,3,-10,24,8,-10,24.4566,3,-7.7038,24.378,3,-11.9],
// 2 24 27.7778 3 -4.4444 24.2857 3 -11.4286
  [2,24,27.7778,3,-4.4444,24.2857,3,-11.4286],
// 4 16 27.7038 3 -4.4566 27.7778 3 -4.4444 24.2857 3 -11.4286 24 3 -10
  [4,16,27.7038,3,-4.4566,27.7778,3,-4.4444,24.2857,3,-11.4286,24,3,-10],
// 
// 4 16 24.2857 8 -11.4286 24.2857 3 -11.4286 20 0 -20 20 8 -20
  [4,16,24.2857,8,-11.4286,24.2857,3,-11.4286,20,0,-20,20,8,-20],
// 3 16 27.7778 3 -4.4444 20 0 -20 24.2857 3 -11.4286
  [3,16,27.7778,3,-4.4444,20,0,-20,24.2857,3,-11.4286],
// 4 16 31.35 3 2.7 38.5 0 17 20 0 -20 27.7778 3 -4.4444
  [4,16,31.35,3,2.7,38.5,0,17,20,0,-20,27.7778,3,-4.4444],
// 4 16 31.35 3 2.7 27.7778 3 -4.4444 27.7778 8 -4.4444 31.35 8 2.7
  [4,16,31.35,3,2.7,27.7778,3,-4.4444,27.7778,8,-4.4444,31.35,8,2.7],
// 3 16 36.83 3 13.66 38.5 0 17 31.35 3 2.7
  [3,16,36.83,3,13.66,38.5,0,17,31.35,3,2.7],
// 4 16 36.83 8 13.66 38.5 8 17 38.5 0 17 36.83 3 13.66
  [4,16,36.83,8,13.66,38.5,8,17,38.5,0,17,36.83,3,13.66],
];
module ldraw_lib__s__51739s01(step=0, col=false, unit=2/5, alt=false, line=0.2, solid=!$preview)
    makepoly(ldraw_lib__s__51739s01(), step=step, col=col, unit=unit, alt=alt, line=line, solid=solid);
ldraw_lib__s__51739s01(line=0.2);
// file: ../p/box5.scad
use <../lib.scad>
function ldraw_lib__box5() = [
// 0 Box with 5 Faces and All Edges
// 0 Name: box5.dat
// 0 Author: James Jessiman
// 0 !LDRAW_ORG Primitive UPDATE 2012-01
// 0 !LICENSE Licensed under CC BY 2.0 and CC BY 4.0 : see CAreadme.txt
// 
// 0 BFC CERTIFY CCW
  [0,"BFC","CERTIFY"],
  [0,"BFC","CCW"],
// 
// 0 !HISTORY 2002-04-03 [sbliss] Modified for BFC compliance
// 0 !HISTORY 2002-04-25 [PTadmin] Official Update 2002-02
// 0 !HISTORY 2007-06-24 [PTadmin] Header formatted for Contributor Agreement
// 0 !HISTORY 2008-07-01 [PTadmin] Official Update 2008-01
// 0 !HISTORY 2012-02-16 [Philo] Changed to CCW
// 0 !HISTORY 2012-03-30 [PTadmin] Official Update 2012-01
// 
// 
// 2 24 1 1 1 -1 1 1
  [2,24,1,1,1,-1,1,1],
// 2 24 -1 1 1 -1 1 -1
  [2,24,-1,1,1,-1,1,-1],
// 2 24 -1 1 -1 1 1 -1
  [2,24,-1,1,-1,1,1,-1],
// 2 24 1 1 -1 1 1 1
  [2,24,1,1,-1,1,1,1],
// 2 24 1 0 1 -1 0 1
  [2,24,1,0,1,-1,0,1],
// 2 24 -1 0 1 -1 0 -1
  [2,24,-1,0,1,-1,0,-1],
// 2 24 -1 0 -1 1 0 -1
  [2,24,-1,0,-1,1,0,-1],
// 2 24 1 0 -1 1 0 1
  [2,24,1,0,-1,1,0,1],
// 2 24 1 0 1 1 1 1
  [2,24,1,0,1,1,1,1],
// 2 24 -1 0 1 -1 1 1
  [2,24,-1,0,1,-1,1,1],
// 2 24 1 0 -1 1 1 -1
  [2,24,1,0,-1,1,1,-1],
// 2 24 -1 0 -1 -1 1 -1
  [2,24,-1,0,-1,-1,1,-1],
// 4 16 -1 1 1 1 1 1 1 1 -1 -1 1 -1
  [4,16,-1,1,1,1,1,1,1,1,-1,-1,1,-1],
// 4 16 -1 1 1 -1 0 1 1 0 1 1 1 1
  [4,16,-1,1,1,-1,0,1,1,0,1,1,1,1],
// 4 16 -1 1 -1 -1 0 -1 -1 0 1 -1 1 1
  [4,16,-1,1,-1,-1,0,-1,-1,0,1,-1,1,1],
// 4 16 1 1 -1 1 0 -1 -1 0 -1 -1 1 -1
  [4,16,1,1,-1,1,0,-1,-1,0,-1,-1,1,-1],
// 4 16 1 1 1 1 0 1 1 0 -1 1 1 -1
  [4,16,1,1,1,1,0,1,1,0,-1,1,1,-1],
];
makepoly(ldraw_lib__box5(), line=0.2);
// file: ../p/box2-7.scad
use <../lib.scad>
function ldraw_lib__box2_7() = [
// 0 Box with  2 Faces without  7 Edges
// 0 Name: box2-7.dat
// 0 Author: Willy Tschager [Holly-Wood]
// 0 !LDRAW_ORG Primitive UPDATE 2024-01
// 0 !LICENSE Licensed under CC BY 4.0 : see CAreadme.txt
// 
// 0 BFC CERTIFY CCW
  [0,"BFC","CERTIFY"],
  [0,"BFC","CCW"],
// 
// 0 !HISTORY 2009-05-02 [PTadmin] Official Update 2009-01
// 0 !HISTORY 2024-01-02 [Holly-Wood] Complete re-write, original by guyvivan
// 0 !HISTORY 2024-01-29 [OrionP] Official Update 2024-01
// 
// 2 24 -1 1 -1 -1 1 1
  [2,24,-1,1,-1,-1,1,1],
// 2 24 1 1 1 1 1 -1
  [2,24,1,1,1,1,1,-1],
// 4 16 -1 1 1 1 1 1 1 1 -1 -1 1 -1
  [4,16,-1,1,1,1,1,1,1,1,-1,-1,1,-1],
// 
// 2 24 -1 1 1 -1 -1 1
  [2,24,-1,1,1,-1,-1,1],
// 2 24 1 1 1 1 -1 1
  [2,24,1,1,1,1,-1,1],
// 4 16 1 -1 1 1 1 1 -1 1 1 -1 -1 1
  [4,16,1,-1,1,1,1,1,-1,1,1,-1,-1,1],
// 
// 2 24 -1 1 1 1 1 1
  [2,24,-1,1,1,1,1,1],
];
module ldraw_lib__box2_7(step=0, col=false, unit=2/5, alt=false, line=0.2, solid=!$preview)
    makepoly(ldraw_lib__box2_7(), step=step, col=col, unit=unit, alt=alt, line=line, solid=solid);
ldraw_lib__box2_7(line=0.2);
// file: ../p/box2-5.scad
use <../lib.scad>
$fa=1; $fs=0.2;
function ldraw_lib__box2_5(realsolid=false) = [
// 0 Box with 2 Faces without 5 Edges
// 0 Name: box2-5.dat
// 0 Author: Steffen [Steffen]
// 0 !LDRAW_ORG Primitive UPDATE 2003-03
// 0 !LICENSE Licensed under CC BY 2.0 and CC BY 4.0 : see CAreadme.txt
// 
// 0 BFC CERTIFY CCW
  [0,"BFC","CERTIFY"],
  [0,"BFC","CCW"],
// 
// 0 !HISTORY 2003-12-19 [PTadmin] Official Update 2003-03
// 0 !HISTORY 2007-06-24 [PTadmin] Header formatted for Contributor Agreement
// 0 !HISTORY 2008-07-01 [PTadmin] Official Update 2008-01
// 
// 
// 2 24 1 1 1 -1 1 1
  [2,24,1,1,1,-1,1,1],
// 2 24 1 1 -1 -1 1 -1
  [2,24,1,1,-1,-1,1,-1],
// 2 24 1 -1 1 -1 -1 1
  [2,24,1,-1,1,-1,-1,1],
// 2 24 -1 -1 1 -1 1 1
  [2,24,-1,-1,1,-1,1,1],
// 2 24 1 -1 1 1 1 1
  [2,24,1,-1,1,1,1,1],
// 2 24 -1 1 -1 -1 1 1
  [2,24,-1,1,-1,-1,1,1],
// 2 24 1 1 -1 1 1 1
  [2,24,1,1,-1,1,1,1],
// 4 16 1 1 1 1 1 -1 -1 1 -1 -1 1 1
  [4,16,1,1,1,1,1,-1,-1,1,-1,-1,1,1],
// 4 16 1 1 1 -1 1 1 -1 -1 1 1 -1 1
  [4,16,1,1,1,-1,1,1,-1,-1,1,1,-1,1],
// 0
];
module ldraw_lib__box2_5(step=0, col=false, unit=2/5, alt=false, line=0.2, solid=!$preview)
    makepoly(ldraw_lib__box2_5(solid), step=step, col=col, unit=unit, alt=alt, line=line, solid=solid);
ldraw_lib__box2_5(line=0.2);
// file: ../p/stug-1x2.scad
use <../lib.scad>
use <stud.scad>
$fa=1; $fs=0.2;
function ldraw_lib__stug_1x2(realsolid=false) = [
// 0 Stud Group  1 x  2
// 0 Name: stug-1x2.dat
// 0 Author: Steffen [Steffen]
// 0 !LDRAW_ORG Primitive UPDATE 2011-01
// 0 !LICENSE Licensed under CC BY 2.0 and CC BY 4.0 : see CAreadme.txt
// 
// 0 BFC CERTIFY CCW
  [0,"BFC","CERTIFY"],
  [0,"BFC","CCW"],
// 
// 0 !HISTORY 2011-07-25 [PTadmin] Official Update 2011-01
// 
// 
// 1 16 -10 0 0 1 0 0 0 1 0 0 0 1 stud.dat
  [1,16,-10,0,0,1,0,0,0,1,0,0,0,1, ldraw_lib__stud(realsolid)],
// 1 16 10 0 0 1 0 0 0 1 0 0 0 1 stud.dat
  [1,16,10,0,0,1,0,0,0,1,0,0,0,1, ldraw_lib__stud(realsolid)],
];
module ldraw_lib__stug_1x2(step=0, col=false, unit=2/5, alt=false, line=0.2, solid=!$preview)
    makepoly(ldraw_lib__stug_1x2(solid), step=step, col=col, unit=unit, alt=alt, line=line, solid=solid);
ldraw_lib__stug_1x2(line=0.2);
// file: s/24299s01.scad
use <../../lib.scad>
use <../../p/box2-5.scad>
use <../../p/box2-7.scad>
use <../../p/box5.scad>
use <51739s01.scad>
use <../../p/stud3.scad>
function ldraw_lib__s__24299s01() = [
// 0 ~Wing  2 x  2 Left without Studs and Top Surface
// 0 Name: s\24299s01.dat
// 0 Author: Magnus Forsberg [MagFors]
// 0 !LDRAW_ORG Subpart UPDATE 2025-07
// 0 !LICENSE Licensed under CC BY 4.0 : see CAreadme.txt
// 
// 0 BFC CERTIFY CCW
  [0,"BFC","CERTIFY"],
  [0,"BFC","CCW"],
// 
// 0 !HISTORY 2017-12-30 [PTadmin] Official Update 2017-01
// 0 !HISTORY 2025-07-12 [MagFors] Removed top surface for prints
// 0 !HISTORY 2025-07-27 [OrionP] Official Update 2025-07
// 
// 1 16 -10 4 0 0 -10 0 -4 0 0 0 0 -20 box2-5.dat
  [1,16,-10,4,0,0,-10,0,-4,0,0,0,0,-20, ldraw_lib__box2_5()],
// 1 16 -0.75 4 18.5 0 19.25 0 -4 0 0 0 0 1.5 box2-7.dat
  [1,16,-0.75,4,18.5,0,19.25,0,-4,0,0,0,0,1.5, ldraw_lib__box2_7()],
// 1 16 -10 3 0 0 0 -1 0 -1.25 0 1 0 0 stud3.dat
  [1,16,-10,3,0,0,0,-1,0,-1.25,0,1,0,0, ldraw_lib__stud3()],
// 0 BFC INVERTNEXT
  [0,"BFC","INVERTNEXT"],
// 1 16 -10 8 0 0 0 -6 0 -5 0 16 0 0 box5.dat
  [1,16,-10,8,0,0,0,-6,0,-5,0,16,0,0, ldraw_lib__box5()],
// 4 16 -4 8 -16 0 8 -20 -20 8 -20 -16 8 -16
  [4,16,-4,8,-16,0,8,-20,-20,8,-20,-16,8,-16],
// 4 16 -16 8 -16 -20 8 -20 -20 8 20 -16 8 16
  [4,16,-16,8,-16,-20,8,-20,-20,8,20,-16,8,16],
// 4 16 -16 8 16 -20 8 20 18.5 8 20 -4 8 16
  [4,16,-16,8,16,-20,8,20,18.5,8,20,-4,8,16],
// 1 16 -20 0 0 1 0 0 0 1 0 0 0 1 s\51739s01.dat
  [1,16,-20,0,0,1,0,0,0,1,0,0,0,1, ldraw_lib__s__51739s01()],
];
module ldraw_lib__s__24299s01(step=0, col=false, unit=2/5, alt=false, line=0.2, solid=!$preview)
    makepoly(ldraw_lib__s__24299s01(), step=step, col=col, unit=unit, alt=alt, line=line, solid=solid);
ldraw_lib__s__24299s01(line=0.2);
// file: s/24299p01s01.scad
use <../../lib.scad>
function ldraw_lib__s__24299p01s01() = [
// 0 ~Wing  2 x  2 Left with 3 Black Stripes
// 0 Name: s\24299p01s01.dat
// 0 Author: Gabriel Läufer [Dr.Bricktacular]
// 0 !LDRAW_ORG Subpart UPDATE 2025-07
// 0 !LICENSE Licensed under CC BY 4.0 : see CAreadme.txt
// 
// 0 BFC CERTIFY CCW
  [0,"BFC","CERTIFY"],
  [0,"BFC","CCW"],
// 
// 0 !HISTORY 2025-07-12 [MagFors] Reworked as pattern subfile
// 0 !HISTORY 2025-07-27 [OrionP] Official Update 2025-07
// 
// 0 // Pattern
// 4 0 17.4 0 17 -1.1 0 17 -1.1 0 9.4 13.6 0 9.4
  [4,0,17.4,0,17,-1.1,0,17,-1.1,0,9.4,13.6,0,9.4],
// 4 0 10.8 0 3.8 -1.1 0 3.8 -1.1 0 -3.8 7 0 -3.8
  [4,0,10.8,0,3.8,-1.1,0,3.8,-1.1,0,-3.8,7,0,-3.8],
// 4 0 4.2 0 -9.4 -1.1 0 -9.4 -1.1 0 -16.7 .55 0 -16.7
  [4,0,4.2,0,-9.4,-1.1,0,-9.4,-1.1,0,-16.7,.55,0,-16.7],
// 4 16 10.8 0 3.8 13.6 0 9.4 -1.1 0 9.4 -1.1 0 3.8
  [4,16,10.8,0,3.8,13.6,0,9.4,-1.1,0,9.4,-1.1,0,3.8],
// 4 16 7 0 -3.8 -1.1 0 -3.8 -1.1 0 -9.4 4.2 0 -9.4
  [4,16,7,0,-3.8,-1.1,0,-3.8,-1.1,0,-9.4,4.2,0,-9.4],
// 3 16 -1.1 0 17 -20 0 20 -1.1 0 9.4
  [3,16,-1.1,0,17,-20,0,20,-1.1,0,9.4],
// 3 16 -1.1 0 9.4 -20 0 20 -1.1 0 3.8
  [3,16,-1.1,0,9.4,-20,0,20,-1.1,0,3.8],
// 4 16 -20 0 20 -20 0 -20 -1.1 0 -3.8 -1.1 0 3.8
  [4,16,-20,0,20,-20,0,-20,-1.1,0,-3.8,-1.1,0,3.8],
// 3 16 -1.1 0 -9.4 -1.1 0 -3.8 -20 0 -20
  [3,16,-1.1,0,-9.4,-1.1,0,-3.8,-20,0,-20],
// 3 16 -1.1 0 -16.7 -1.1 0 -9.4 -20 0 -20
  [3,16,-1.1,0,-16.7,-1.1,0,-9.4,-20,0,-20],
// 4 16 -1.1 0 -16.7 -20 0 -20 0 0 -20 .55 0 -16.7
  [4,16,-1.1,0,-16.7,-20,0,-20,0,0,-20,.55,0,-16.7],
// 4 16 18.5 0 20 -20 0 20 -1.1 0 17 17.4 0 17
  [4,16,18.5,0,20,-20,0,20,-1.1,0,17,17.4,0,17],
// 3 16 18.5 0 17 18.5 0 20 17.4 0 17
  [3,16,18.5,0,17,18.5,0,20,17.4,0,17],
// 3 16 4.2 0 -9.4 .55 0 -16.7 0 0 -20
  [3,16,4.2,0,-9.4,.55,0,-16.7,0,0,-20],
// 3 16 0 0 -20 7 0 -3.8 4.2 0 -9.4
  [3,16,0,0,-20,7,0,-3.8,4.2,0,-9.4],
// 4 16 10.8 0 3.8 7 0 -3.8 0 0 -20 18.5 0 17
  [4,16,10.8,0,3.8,7,0,-3.8,0,0,-20,18.5,0,17],
// 3 16 10.8 0 3.8 18.5 0 17 13.6 0 9.4
  [3,16,10.8,0,3.8,18.5,0,17,13.6,0,9.4],
// 3 16 18.5 0 17 17.4 0 17 13.6 0 9.4
  [3,16,18.5,0,17,17.4,0,17,13.6,0,9.4],
];
module ldraw_lib__s__24299p01s01(step=0, col=false, unit=2/5, alt=false, line=0.2, solid=!$preview)
    makepoly(ldraw_lib__s__24299p01s01(), step=step, col=col, unit=unit, alt=alt, line=line, solid=solid);
ldraw_lib__s__24299p01s01(line=0.2);
// main file
use <../lib.scad>
use <s/24299p01s01.scad>
use <s/24299s01.scad>
use <../p/stug-1x2.scad>
function ldraw_lib__24307p01() = [
// 0 Wing  2 x  2 Right with 3 Black Stripes Pattern
// 0 Name: 24307p01.dat
// 0 Author: Gabriel Läufer [Dr.Bricktacular]
// 0 !LDRAW_ORG Part UPDATE 2025-07
// 0 !LICENSE Licensed under CC BY 4.0 : see CAreadme.txt
// 
// 0 BFC CERTIFY CCW
  [0,"BFC","CERTIFY"],
  [0,"BFC","CCW"],
// 
// 0 !KEYWORDS Bricklink 24307pb01, Captain Rex Helmet, Helmet Collection
// 0 !KEYWORDS Rebrickable 24307pr0001, Set 75349
// 
// 0 !HISTORY 2025-07-12 [MagFors] corrected subfile usage
// 0 !HISTORY 2025-07-27 [OrionP] Official Update 2025-07
// 
// 0 // Pattern-Basepart
// 1 16 10 0 0 0 0 -1 0 1 0 1 0 0 stug-1x2.dat
  [1,16,10,0,0,0,0,-1,0,1,0,1,0,0, ldraw_lib__stug_1x2()],
// 1 16 0 0 0 -1 0 0 0 1 0 0 0 1 s\24299s01.dat
  [1,16,0,0,0,-1,0,0,0,1,0,0,0,1, ldraw_lib__s__24299s01()],
// 0 // Pattern
// 1 16 0 0 0 -1 0 0 0 1 0 0 0 1 s\24299p01s01.dat
  [1,16,0,0,0,-1,0,0,0,1,0,0,0,1, ldraw_lib__s__24299p01s01()],
];
module ldraw_lib__24307p01(step=0, col=false, unit=2/5, alt=false, line=0.2, solid=!$preview)
    makepoly(ldraw_lib__24307p01(), step=step, col=col, unit=unit, alt=alt, line=line, solid=solid);
ldraw_lib__24307p01(line=0.2);
